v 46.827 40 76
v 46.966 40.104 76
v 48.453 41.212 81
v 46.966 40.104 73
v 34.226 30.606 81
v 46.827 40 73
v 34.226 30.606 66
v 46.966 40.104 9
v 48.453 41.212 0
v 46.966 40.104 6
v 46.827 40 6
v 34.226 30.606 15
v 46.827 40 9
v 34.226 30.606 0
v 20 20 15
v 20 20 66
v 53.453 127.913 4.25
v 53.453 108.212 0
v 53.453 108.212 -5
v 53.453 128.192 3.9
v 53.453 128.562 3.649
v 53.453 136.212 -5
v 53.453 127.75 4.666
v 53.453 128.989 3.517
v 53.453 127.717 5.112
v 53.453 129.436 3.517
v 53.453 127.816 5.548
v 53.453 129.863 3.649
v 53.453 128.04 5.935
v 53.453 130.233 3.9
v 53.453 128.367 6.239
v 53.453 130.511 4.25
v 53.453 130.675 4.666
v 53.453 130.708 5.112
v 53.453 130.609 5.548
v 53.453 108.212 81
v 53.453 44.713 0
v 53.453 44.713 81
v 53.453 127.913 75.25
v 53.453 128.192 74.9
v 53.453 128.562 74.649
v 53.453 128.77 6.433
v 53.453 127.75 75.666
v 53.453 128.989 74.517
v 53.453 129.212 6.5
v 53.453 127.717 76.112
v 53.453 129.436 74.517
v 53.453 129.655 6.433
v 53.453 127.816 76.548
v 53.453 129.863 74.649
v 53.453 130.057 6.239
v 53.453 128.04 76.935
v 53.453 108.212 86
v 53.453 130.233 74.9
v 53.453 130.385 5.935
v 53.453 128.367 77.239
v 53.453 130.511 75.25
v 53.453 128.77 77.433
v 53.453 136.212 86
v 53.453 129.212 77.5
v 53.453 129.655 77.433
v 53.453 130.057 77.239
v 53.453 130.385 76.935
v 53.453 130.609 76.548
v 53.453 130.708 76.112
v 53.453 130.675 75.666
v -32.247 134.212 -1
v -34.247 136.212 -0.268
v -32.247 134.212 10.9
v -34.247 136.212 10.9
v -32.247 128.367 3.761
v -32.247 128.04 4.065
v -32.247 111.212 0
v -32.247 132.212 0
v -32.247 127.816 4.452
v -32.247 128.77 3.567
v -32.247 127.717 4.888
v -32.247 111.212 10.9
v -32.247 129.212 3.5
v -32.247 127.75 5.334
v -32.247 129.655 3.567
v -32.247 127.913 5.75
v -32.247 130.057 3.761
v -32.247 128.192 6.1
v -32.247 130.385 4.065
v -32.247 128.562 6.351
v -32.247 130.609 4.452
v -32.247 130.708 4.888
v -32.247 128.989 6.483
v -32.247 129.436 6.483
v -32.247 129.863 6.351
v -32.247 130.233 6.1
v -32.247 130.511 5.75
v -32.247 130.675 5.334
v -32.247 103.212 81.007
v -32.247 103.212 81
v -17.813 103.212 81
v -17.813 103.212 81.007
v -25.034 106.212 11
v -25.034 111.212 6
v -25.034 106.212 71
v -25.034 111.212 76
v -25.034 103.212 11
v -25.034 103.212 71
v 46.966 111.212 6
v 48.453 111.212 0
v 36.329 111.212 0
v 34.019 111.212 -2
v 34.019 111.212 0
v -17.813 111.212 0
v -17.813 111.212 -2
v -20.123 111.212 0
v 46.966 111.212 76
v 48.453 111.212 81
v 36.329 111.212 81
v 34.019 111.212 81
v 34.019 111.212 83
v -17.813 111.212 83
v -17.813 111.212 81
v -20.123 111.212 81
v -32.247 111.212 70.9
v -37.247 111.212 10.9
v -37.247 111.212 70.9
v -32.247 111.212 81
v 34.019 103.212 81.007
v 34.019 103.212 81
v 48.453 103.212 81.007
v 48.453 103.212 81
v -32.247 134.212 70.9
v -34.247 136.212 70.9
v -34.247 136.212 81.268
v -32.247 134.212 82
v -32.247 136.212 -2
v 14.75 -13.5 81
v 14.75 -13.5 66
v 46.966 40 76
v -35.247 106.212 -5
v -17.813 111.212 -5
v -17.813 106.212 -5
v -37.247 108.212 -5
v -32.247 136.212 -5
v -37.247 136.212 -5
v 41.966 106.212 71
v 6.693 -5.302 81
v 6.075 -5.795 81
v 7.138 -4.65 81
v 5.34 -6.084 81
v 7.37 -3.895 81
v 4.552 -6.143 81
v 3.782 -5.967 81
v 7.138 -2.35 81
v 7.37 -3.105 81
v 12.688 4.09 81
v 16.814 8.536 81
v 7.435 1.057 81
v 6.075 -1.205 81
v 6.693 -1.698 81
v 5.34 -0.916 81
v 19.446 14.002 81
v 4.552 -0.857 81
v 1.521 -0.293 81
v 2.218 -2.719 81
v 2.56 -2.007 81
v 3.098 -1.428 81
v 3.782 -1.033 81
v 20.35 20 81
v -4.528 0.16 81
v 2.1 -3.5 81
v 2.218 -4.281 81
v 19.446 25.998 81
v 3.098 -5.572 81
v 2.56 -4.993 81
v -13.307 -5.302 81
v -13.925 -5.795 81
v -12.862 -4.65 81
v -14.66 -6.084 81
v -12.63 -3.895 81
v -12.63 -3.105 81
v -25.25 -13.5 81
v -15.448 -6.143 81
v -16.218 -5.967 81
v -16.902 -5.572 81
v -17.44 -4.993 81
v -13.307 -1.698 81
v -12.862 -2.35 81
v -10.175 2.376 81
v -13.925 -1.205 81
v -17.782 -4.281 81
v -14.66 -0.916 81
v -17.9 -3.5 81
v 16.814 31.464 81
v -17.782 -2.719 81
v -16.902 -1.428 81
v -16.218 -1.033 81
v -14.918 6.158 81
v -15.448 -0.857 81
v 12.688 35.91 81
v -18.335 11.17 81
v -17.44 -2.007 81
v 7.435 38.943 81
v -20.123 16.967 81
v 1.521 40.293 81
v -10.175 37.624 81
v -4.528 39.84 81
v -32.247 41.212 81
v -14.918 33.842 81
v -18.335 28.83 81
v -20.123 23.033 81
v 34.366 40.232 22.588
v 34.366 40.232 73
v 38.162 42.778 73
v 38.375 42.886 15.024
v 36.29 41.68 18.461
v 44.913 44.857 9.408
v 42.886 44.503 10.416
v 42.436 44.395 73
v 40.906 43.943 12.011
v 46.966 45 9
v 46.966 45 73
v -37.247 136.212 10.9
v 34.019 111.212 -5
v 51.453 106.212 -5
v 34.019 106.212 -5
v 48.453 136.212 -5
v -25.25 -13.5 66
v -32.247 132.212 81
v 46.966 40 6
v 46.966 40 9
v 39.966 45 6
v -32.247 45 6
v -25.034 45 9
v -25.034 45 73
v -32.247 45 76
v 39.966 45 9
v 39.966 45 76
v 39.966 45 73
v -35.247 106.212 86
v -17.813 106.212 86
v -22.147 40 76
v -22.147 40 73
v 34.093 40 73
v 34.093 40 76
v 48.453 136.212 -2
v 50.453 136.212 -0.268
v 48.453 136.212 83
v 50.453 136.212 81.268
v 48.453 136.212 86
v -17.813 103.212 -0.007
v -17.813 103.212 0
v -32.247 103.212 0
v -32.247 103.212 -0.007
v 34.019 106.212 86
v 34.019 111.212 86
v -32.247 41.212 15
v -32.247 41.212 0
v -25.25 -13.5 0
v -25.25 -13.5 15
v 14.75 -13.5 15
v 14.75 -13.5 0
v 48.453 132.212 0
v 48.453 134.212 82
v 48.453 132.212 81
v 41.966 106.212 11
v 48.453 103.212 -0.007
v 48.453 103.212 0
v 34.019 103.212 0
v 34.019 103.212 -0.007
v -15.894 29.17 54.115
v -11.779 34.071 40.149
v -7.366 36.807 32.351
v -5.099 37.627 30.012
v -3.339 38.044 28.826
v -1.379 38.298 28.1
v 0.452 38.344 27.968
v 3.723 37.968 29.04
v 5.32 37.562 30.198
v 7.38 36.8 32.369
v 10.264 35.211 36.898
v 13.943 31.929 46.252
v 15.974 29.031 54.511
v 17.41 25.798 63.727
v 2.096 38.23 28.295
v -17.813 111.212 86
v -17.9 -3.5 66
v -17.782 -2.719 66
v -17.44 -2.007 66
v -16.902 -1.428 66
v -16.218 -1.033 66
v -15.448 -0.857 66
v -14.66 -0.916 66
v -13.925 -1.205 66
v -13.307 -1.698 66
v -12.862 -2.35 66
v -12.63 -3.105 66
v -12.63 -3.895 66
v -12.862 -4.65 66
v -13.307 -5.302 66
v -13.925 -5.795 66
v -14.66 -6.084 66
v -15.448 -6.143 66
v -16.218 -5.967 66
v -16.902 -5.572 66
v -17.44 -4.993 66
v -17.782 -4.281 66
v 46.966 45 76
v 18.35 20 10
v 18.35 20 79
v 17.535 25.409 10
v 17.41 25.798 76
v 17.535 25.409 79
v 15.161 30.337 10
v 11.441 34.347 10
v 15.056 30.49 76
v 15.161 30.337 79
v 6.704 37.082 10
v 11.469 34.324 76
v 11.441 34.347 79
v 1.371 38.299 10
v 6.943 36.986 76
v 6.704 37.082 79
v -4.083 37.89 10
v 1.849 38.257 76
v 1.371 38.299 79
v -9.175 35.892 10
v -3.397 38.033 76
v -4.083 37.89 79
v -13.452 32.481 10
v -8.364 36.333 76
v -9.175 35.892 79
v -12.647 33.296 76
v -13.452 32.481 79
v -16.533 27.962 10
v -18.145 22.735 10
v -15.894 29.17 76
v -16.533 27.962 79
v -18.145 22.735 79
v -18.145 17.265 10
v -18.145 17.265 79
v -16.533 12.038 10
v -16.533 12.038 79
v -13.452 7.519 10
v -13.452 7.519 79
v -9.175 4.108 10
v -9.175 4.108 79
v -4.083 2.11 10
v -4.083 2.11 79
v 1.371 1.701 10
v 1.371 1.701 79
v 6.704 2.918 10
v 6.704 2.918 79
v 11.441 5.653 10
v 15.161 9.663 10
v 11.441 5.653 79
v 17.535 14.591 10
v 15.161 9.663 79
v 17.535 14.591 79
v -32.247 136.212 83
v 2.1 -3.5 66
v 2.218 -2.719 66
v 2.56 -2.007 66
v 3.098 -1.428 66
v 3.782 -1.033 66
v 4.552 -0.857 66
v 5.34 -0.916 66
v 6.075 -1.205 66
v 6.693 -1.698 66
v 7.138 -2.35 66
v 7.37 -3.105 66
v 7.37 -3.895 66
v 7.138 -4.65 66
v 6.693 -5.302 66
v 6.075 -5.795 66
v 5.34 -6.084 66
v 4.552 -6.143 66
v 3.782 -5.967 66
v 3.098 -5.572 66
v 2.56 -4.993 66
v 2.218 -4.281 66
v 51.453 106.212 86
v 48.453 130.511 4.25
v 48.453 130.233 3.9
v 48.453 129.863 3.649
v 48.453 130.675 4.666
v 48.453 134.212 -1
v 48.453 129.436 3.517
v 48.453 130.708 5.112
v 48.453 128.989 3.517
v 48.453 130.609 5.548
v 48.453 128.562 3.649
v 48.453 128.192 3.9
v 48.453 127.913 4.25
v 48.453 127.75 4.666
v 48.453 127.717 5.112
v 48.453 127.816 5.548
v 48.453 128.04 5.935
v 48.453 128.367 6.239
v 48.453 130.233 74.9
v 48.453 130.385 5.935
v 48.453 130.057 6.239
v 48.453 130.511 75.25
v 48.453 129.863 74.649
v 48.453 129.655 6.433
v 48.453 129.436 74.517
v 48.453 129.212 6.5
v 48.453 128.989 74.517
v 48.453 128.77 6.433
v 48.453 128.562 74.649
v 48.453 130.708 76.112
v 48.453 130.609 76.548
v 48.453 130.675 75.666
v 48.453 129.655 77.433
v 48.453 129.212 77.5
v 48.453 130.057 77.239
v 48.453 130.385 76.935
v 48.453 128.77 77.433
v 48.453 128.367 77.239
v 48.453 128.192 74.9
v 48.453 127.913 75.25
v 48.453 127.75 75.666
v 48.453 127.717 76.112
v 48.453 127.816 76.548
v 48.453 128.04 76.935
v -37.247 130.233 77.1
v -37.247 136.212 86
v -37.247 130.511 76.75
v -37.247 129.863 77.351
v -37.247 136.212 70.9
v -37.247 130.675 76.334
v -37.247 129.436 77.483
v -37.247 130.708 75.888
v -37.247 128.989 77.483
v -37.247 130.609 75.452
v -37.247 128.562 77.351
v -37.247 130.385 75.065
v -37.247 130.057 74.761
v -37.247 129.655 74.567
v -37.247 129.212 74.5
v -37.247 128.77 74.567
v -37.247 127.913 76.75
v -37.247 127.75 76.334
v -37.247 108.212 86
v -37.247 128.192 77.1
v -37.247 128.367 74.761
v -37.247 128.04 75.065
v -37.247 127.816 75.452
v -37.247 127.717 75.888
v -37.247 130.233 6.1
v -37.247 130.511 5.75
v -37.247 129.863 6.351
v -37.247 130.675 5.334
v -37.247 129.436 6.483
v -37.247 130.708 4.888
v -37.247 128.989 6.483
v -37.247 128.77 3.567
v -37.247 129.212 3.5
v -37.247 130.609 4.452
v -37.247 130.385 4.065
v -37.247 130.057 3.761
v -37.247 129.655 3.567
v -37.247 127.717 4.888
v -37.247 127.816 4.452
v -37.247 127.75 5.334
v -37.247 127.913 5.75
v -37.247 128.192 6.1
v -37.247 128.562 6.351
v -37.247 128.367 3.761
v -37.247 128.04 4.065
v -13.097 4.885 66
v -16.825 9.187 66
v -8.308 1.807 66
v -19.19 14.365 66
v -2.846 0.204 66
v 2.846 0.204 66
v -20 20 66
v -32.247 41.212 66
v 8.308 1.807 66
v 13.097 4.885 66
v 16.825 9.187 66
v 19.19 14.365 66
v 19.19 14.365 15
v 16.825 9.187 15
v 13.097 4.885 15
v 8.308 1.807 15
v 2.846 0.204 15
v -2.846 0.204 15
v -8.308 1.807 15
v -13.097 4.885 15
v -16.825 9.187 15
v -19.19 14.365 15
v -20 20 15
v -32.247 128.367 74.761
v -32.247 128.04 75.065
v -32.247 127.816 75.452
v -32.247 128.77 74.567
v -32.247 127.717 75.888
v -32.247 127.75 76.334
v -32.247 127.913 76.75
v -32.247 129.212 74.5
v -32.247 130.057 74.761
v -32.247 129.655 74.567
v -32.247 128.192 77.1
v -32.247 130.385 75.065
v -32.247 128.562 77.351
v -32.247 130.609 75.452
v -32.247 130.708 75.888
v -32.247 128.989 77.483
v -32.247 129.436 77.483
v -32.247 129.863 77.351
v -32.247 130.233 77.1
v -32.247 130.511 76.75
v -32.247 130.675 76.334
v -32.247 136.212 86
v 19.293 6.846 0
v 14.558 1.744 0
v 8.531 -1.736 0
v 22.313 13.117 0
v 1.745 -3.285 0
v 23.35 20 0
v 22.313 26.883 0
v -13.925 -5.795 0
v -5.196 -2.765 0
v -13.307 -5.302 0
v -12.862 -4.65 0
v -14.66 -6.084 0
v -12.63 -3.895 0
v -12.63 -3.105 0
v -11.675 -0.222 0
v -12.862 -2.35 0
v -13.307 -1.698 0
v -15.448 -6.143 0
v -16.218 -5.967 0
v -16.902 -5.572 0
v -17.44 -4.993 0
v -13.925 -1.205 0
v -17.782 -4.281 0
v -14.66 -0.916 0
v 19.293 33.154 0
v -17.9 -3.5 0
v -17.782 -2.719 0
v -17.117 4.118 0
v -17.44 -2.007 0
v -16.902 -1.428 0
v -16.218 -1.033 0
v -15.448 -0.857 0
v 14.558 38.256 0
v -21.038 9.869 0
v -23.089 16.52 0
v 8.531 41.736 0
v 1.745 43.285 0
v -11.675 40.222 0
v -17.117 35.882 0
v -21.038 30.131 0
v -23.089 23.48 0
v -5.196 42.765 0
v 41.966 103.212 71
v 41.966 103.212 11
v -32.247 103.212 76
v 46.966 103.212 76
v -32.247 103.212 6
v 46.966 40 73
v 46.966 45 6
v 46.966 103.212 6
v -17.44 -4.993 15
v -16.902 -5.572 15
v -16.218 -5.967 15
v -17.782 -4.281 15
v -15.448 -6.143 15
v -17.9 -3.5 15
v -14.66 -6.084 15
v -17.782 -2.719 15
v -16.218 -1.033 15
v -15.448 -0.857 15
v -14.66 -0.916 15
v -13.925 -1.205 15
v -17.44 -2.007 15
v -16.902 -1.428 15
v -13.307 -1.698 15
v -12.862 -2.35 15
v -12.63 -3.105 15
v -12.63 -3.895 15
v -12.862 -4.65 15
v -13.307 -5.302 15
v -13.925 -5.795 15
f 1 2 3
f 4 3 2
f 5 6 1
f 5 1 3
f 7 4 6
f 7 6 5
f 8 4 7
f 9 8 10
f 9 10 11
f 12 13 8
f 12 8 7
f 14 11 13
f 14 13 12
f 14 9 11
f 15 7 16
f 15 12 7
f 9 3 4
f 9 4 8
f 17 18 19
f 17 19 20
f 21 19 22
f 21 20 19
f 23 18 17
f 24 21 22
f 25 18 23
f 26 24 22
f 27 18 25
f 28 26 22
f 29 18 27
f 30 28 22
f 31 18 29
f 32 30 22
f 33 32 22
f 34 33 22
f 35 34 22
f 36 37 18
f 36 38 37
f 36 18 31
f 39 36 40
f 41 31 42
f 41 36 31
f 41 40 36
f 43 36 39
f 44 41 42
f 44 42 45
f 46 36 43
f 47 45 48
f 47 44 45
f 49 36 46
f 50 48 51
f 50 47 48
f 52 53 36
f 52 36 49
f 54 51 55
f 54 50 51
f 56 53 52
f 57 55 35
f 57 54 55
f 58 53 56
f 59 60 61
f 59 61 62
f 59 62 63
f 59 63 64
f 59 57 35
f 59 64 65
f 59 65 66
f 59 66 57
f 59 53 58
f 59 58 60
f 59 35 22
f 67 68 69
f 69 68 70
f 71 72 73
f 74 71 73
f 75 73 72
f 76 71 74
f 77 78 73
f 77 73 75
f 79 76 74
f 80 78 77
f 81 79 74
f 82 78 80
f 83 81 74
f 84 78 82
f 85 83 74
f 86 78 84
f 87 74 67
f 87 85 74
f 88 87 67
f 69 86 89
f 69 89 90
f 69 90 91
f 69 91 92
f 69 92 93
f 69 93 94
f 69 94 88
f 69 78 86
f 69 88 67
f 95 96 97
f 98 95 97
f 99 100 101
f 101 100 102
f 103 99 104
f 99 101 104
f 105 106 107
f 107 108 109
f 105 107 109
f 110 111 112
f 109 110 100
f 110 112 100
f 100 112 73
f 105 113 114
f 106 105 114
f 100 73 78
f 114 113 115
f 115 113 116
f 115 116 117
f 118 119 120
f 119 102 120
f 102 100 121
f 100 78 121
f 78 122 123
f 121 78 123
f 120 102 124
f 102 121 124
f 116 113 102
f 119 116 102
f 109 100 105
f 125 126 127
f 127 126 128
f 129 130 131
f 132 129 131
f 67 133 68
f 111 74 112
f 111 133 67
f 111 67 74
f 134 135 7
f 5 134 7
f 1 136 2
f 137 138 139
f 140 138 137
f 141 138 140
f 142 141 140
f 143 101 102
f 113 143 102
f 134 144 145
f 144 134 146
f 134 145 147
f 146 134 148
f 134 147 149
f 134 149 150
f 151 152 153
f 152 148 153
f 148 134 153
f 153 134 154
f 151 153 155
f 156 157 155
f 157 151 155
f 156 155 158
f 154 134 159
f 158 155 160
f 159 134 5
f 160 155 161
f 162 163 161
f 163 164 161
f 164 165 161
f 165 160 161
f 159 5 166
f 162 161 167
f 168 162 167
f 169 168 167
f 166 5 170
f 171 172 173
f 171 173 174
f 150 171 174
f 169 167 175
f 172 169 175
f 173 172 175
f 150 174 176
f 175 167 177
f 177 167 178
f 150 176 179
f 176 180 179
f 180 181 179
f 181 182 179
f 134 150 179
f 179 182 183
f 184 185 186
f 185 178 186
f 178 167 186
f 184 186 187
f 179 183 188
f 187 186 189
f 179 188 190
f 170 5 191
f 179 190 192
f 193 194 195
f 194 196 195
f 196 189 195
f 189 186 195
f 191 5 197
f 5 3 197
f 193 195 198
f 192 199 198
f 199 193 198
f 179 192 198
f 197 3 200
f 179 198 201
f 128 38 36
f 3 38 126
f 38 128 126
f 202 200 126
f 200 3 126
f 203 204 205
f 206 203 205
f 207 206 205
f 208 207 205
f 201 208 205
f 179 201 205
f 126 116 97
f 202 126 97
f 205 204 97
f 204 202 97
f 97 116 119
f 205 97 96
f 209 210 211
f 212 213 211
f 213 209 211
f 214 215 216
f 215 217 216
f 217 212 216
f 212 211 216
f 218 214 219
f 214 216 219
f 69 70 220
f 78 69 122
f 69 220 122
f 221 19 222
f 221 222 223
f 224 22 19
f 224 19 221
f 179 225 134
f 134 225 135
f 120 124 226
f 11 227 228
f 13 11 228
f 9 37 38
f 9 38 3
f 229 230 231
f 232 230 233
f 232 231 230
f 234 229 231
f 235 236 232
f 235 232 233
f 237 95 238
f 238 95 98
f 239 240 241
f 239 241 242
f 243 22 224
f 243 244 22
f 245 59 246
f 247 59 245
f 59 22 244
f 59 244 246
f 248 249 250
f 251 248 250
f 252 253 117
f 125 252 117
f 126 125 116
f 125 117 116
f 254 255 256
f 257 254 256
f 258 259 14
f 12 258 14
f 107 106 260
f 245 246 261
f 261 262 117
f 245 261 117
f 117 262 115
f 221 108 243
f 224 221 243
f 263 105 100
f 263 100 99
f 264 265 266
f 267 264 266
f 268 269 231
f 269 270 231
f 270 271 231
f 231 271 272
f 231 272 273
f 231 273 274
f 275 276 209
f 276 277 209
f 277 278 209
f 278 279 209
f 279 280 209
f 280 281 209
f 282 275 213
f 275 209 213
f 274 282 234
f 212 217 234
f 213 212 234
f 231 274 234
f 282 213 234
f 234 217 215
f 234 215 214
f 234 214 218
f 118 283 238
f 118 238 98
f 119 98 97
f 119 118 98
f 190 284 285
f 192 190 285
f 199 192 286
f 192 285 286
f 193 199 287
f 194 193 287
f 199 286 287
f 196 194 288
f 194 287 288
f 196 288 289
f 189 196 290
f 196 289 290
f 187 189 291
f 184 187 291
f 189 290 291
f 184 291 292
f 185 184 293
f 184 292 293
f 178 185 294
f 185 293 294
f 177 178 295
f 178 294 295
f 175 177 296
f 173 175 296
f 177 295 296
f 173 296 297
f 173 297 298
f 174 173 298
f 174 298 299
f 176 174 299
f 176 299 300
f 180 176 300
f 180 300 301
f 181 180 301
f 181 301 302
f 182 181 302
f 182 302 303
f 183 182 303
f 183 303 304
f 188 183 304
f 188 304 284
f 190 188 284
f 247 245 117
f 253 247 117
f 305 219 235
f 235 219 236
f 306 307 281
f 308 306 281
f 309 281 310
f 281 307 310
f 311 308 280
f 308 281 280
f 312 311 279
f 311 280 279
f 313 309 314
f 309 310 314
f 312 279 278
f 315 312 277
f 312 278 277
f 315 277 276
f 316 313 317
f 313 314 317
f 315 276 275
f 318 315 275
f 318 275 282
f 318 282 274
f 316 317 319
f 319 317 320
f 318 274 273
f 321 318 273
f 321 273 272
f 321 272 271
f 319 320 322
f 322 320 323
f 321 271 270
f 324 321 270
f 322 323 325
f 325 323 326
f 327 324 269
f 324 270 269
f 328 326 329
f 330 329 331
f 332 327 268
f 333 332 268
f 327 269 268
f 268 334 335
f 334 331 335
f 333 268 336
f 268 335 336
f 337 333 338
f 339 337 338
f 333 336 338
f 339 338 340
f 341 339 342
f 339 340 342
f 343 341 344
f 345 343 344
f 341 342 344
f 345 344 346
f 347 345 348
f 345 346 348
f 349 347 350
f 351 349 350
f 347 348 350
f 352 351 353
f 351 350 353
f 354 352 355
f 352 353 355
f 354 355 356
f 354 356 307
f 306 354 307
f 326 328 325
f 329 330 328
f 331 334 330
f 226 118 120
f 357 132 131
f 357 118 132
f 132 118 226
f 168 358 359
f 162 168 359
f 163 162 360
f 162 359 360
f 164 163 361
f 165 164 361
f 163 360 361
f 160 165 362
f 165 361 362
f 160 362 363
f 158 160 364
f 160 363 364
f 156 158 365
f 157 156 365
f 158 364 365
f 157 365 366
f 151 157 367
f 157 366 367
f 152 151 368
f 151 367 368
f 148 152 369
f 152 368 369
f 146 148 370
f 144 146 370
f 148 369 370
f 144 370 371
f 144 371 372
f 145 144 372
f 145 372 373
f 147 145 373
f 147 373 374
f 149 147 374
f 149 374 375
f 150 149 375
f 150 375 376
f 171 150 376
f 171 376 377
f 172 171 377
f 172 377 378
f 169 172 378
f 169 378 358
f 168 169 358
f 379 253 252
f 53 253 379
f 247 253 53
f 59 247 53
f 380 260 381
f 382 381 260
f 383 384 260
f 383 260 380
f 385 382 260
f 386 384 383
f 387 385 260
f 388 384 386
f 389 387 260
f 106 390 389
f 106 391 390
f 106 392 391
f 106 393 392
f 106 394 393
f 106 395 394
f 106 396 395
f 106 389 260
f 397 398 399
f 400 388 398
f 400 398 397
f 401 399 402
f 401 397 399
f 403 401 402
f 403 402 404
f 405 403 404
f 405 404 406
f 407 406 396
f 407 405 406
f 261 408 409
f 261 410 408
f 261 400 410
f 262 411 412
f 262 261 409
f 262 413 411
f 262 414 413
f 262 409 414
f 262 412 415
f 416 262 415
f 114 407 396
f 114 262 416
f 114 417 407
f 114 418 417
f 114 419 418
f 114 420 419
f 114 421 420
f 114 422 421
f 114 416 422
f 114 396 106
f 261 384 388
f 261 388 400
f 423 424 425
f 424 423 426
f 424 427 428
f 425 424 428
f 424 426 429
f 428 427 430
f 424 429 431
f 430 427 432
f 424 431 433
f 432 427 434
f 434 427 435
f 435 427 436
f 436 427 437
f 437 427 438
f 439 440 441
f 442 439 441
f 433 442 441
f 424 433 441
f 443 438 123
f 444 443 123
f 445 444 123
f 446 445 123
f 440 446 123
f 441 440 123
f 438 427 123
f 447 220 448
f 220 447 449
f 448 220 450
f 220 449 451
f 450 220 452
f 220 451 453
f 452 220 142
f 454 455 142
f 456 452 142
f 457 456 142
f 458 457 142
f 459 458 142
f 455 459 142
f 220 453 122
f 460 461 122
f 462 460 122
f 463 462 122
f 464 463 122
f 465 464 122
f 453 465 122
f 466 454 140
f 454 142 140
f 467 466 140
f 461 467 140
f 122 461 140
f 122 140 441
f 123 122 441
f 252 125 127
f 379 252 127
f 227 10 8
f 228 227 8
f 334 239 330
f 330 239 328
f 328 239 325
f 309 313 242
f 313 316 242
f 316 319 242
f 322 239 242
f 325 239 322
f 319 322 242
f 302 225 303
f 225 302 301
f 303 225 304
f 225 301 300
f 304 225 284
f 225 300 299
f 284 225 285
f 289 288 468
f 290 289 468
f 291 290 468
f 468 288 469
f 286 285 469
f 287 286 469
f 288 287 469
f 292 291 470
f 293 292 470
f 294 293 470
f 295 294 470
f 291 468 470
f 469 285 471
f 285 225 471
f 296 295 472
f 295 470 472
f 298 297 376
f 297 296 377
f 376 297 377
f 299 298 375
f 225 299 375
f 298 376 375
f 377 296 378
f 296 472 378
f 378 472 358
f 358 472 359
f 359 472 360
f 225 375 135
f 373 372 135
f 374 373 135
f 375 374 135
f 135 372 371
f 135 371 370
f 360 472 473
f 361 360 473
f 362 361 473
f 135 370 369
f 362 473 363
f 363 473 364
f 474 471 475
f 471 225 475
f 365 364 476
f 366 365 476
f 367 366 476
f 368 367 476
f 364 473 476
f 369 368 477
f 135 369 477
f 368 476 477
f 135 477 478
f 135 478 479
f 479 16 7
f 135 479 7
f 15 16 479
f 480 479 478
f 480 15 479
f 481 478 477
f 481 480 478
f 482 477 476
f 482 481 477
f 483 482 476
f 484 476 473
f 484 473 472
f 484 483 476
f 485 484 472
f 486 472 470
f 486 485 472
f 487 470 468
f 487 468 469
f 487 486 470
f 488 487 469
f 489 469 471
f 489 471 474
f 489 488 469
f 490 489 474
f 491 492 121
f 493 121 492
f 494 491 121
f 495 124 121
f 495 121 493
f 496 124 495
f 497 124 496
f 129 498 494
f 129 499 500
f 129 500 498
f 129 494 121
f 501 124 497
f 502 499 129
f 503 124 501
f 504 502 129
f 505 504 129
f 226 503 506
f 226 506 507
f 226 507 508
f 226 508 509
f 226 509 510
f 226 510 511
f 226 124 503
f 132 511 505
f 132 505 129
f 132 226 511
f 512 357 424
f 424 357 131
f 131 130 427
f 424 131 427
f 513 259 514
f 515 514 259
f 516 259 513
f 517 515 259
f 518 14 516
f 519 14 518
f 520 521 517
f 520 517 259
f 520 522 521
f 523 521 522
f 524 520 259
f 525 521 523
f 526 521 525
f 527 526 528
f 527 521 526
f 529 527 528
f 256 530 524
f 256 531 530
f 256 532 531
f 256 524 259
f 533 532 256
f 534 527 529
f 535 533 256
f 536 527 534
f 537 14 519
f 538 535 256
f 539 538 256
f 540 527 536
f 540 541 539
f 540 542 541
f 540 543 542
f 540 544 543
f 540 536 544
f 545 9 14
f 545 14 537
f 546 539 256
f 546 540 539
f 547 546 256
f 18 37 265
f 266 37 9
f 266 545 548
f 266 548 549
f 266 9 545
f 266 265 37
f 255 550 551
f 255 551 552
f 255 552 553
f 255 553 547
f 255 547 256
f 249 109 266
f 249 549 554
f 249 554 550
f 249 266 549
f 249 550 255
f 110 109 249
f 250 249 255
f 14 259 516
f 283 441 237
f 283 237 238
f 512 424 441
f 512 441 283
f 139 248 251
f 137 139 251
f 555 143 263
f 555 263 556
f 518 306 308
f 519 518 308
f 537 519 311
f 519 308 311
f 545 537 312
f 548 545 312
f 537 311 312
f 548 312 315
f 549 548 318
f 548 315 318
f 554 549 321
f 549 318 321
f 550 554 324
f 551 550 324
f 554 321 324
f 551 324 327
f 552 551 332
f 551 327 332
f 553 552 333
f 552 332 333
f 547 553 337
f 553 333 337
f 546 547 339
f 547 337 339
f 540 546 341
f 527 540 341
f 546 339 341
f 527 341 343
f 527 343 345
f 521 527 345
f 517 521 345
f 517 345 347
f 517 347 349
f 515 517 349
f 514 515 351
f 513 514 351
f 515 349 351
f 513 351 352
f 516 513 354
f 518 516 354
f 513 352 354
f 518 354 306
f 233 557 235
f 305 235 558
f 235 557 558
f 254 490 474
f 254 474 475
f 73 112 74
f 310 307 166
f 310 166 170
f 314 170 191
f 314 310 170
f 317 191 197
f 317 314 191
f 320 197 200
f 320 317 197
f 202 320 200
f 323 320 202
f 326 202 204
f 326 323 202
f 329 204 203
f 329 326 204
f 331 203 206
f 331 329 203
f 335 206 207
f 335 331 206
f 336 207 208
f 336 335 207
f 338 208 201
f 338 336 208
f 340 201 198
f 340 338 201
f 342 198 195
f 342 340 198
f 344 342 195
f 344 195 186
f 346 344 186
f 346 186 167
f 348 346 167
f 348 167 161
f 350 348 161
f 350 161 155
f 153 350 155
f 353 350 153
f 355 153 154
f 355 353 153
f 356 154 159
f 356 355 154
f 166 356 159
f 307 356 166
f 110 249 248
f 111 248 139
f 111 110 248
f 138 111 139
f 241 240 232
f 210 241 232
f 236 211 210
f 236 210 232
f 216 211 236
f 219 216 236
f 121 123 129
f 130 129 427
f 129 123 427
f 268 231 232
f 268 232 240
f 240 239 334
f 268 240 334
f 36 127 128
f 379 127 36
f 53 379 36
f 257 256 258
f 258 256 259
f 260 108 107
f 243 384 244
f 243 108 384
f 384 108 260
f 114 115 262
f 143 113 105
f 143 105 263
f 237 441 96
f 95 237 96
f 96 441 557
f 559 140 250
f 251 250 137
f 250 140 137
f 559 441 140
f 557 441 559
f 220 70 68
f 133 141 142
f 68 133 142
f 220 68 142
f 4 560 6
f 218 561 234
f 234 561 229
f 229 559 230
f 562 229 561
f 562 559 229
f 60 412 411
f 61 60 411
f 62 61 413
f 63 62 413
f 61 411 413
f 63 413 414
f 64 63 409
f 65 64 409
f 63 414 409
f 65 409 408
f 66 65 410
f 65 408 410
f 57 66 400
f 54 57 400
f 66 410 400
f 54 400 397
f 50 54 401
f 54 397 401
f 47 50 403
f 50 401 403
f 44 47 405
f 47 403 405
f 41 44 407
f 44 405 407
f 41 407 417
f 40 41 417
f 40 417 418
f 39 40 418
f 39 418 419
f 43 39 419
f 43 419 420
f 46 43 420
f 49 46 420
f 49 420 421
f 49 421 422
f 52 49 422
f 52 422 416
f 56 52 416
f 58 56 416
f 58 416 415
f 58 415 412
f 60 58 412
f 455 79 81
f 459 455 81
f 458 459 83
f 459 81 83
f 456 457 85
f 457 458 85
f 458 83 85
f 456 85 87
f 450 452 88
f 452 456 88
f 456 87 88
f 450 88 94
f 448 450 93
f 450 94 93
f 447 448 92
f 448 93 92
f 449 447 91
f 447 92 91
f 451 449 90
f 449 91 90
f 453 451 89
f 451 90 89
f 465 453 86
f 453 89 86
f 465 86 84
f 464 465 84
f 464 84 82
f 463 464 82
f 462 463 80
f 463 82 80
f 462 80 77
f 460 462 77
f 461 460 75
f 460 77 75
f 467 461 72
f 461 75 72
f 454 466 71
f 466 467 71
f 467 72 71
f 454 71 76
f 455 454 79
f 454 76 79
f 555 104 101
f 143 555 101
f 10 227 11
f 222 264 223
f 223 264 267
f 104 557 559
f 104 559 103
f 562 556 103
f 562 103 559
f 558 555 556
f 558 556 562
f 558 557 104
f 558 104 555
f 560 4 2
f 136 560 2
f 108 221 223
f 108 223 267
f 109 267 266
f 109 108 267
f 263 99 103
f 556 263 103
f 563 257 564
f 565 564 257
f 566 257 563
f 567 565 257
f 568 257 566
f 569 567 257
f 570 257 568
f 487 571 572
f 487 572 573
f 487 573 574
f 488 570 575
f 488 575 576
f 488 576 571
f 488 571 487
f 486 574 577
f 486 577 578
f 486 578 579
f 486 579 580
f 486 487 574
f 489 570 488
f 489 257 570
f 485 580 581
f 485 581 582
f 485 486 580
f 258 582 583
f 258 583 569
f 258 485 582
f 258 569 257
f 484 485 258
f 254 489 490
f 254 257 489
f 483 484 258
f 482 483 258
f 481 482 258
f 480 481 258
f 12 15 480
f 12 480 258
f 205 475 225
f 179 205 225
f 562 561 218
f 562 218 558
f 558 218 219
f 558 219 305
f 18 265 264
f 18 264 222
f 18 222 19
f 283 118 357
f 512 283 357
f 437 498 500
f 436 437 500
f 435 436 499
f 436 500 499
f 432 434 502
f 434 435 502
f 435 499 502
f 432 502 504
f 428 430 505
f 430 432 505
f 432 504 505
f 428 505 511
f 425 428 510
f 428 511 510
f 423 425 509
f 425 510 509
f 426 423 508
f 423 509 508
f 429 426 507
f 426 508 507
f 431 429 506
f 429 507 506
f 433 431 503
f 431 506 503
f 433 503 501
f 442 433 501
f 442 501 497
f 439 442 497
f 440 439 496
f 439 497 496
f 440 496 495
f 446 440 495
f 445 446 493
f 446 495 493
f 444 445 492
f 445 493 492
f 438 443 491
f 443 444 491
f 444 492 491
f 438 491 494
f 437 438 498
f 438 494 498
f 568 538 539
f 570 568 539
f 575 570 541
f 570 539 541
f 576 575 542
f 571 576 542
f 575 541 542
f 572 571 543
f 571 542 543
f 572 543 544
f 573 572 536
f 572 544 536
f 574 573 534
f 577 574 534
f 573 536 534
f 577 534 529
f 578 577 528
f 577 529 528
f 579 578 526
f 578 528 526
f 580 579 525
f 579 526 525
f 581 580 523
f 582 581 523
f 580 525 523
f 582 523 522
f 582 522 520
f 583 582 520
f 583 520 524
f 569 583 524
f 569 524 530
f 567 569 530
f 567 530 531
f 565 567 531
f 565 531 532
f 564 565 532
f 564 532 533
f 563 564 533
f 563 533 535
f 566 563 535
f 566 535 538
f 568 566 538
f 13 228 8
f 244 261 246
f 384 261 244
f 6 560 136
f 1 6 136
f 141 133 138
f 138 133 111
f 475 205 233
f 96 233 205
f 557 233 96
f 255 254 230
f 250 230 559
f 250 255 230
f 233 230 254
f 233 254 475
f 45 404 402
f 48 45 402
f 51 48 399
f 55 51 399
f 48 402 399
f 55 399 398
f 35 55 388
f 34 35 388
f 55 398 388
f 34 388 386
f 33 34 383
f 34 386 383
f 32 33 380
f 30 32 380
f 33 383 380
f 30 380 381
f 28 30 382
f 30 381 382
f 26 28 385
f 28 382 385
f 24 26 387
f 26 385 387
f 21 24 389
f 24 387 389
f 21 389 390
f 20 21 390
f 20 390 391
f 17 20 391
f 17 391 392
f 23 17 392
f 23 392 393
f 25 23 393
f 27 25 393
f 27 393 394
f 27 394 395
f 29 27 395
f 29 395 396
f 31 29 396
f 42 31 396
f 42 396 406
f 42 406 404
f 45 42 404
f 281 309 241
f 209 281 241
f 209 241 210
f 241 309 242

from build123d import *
from OCP.BRepFilletAPI import BRepFilletAPI_MakeChamfer

# Parameters (mm, degrees)
AUFSATZ_LINEAR_AUSTRAGEN1_DEPTH      = 81
SCHNITT_LINEAR_START                 = -5
SCHNITT_LINEAR_AUSTRAGEN1_DEPTH      = 70
AUFSATZ_LINEAR_START                 = -7
SKIZZE7_W                            = 3
SKIZZE7_H                            = 5
AUFSATZ_LINEAR_AUSTRAGEN2_DEPTH      = 72
SCHNITT_LINEAR_AUSTRAGEN2_DEPTH      = 156.38326520426057
AUFSATZ_LINEAR_AUSTRAGEN16_REACH     = 147.866
AUFSATZ_LINEAR_AUSTRAGEN17_DEPTH     = 5
AUFSATZ_LINEAR_AUSTRAGEN18_DEPTH     = 5
F_3_0_3_DURCHMESSER_BOHRUNG1_D       = 3
F_3_0_3_DURCHMESSER_BOHRUNG1_DEPTH   = 5
AUFSATZ_LINEAR_AUSTRAGEN19_DEPTH     = 65
F_21_5_21_5_DURCHMESSER_BOHRUNG1_D   = 36.7
SCHNITT_LINEAR_AUSTRAGEN3_DEPTH      = 167.766454168909
FASE1_SIZE                           = 2
AUFSATZ_LINEAR_AUSTRAGEN20_REACH     = 178.15
FASE3_SIZE                           = 2
FASE4_SIZE                           = 2
AUFSATZ_LINEAR_AUSTRAGEN21_REACH     = 178.15
F_3_0_3_DURCHMESSER_BOHRUNG2_D       = 3
AUFSATZ_LINEAR_START_2               = -15
AUFSATZ_LINEAR_AUSTRAGEN22_DEPTH     = 15
AUFSATZ_LINEAR_AUSTRAGEN23_DEPTH     = 15
FASE5_SIZE                           = 3
FASE5_SIZE2                          = 4.992838447051577
F_5_3_5_3_DURCHMESSER_BOHRUNG1_D     = 5.3
F_5_3_5_3_DURCHMESSER_BOHRUNG2_D     = 5.3
F_5_3_5_3_DURCHMESSER_BOHRUNG2_DEPTH = 15
FASE6_SIZE                           = 2
FASE7_SIZE                           = 5
FASE7_SIZE2                          = 10
AUFSATZ_LINEAR_AUSTRAGEN24_DEPTH     = 81
SCHNITT_LINEAR_START_2               = -66.212436
SCHNITT_LINEAR_AUSTRAGEN4_DEPTH      = 66.212436
SCHNITT_LINEAR_AUSTRAGEN5_REACH      = 186.868
AUFSATZ_LINEAR_AUSTRAGEN25_DEPTH     = 7
AUFSATZ_LINEAR_AUSTRAGEN27_REACH     = 169.248
VERRUNDUNG1_R                        = 20


with BuildPart() as part:
    # Skizze1 → Aufsatz-Linear austragen1 (new body)
    with BuildSketch(Plane.XY):
        with BuildLine():
            Line((-20, 19.999999999999996), (-32.24700538379256, 41.212435565298236))
            Line((-32.24700538379256, 41.212435565298236), (-32.24700538379256, 111.21243556529824))
            Line((-32.24700538379256, 111.21243556529824), (48.45299461620745, 111.21243556529824))
            Line((48.45299461620745, 111.21243556529824), (48.45299461620745, 41.21243556529823))
            Line((48.45299461620745, 41.21243556529823), (20, 19.999999999999996))
            ThreePointArc((20, 19.999999999999996), (1.22e-15, 0), (-20, 19.999999999999996))
        make_face()
    extrude(amount=AUFSATZ_LINEAR_AUSTRAGEN1_DEPTH)

    # Skizze2 → Schnitt-Linear austragen1 (cut)
    with BuildSketch(Plane.XY.offset(81).offset(SCHNITT_LINEAR_START)):
        with BuildLine():
            Line((10.6, 19.999999999999993), (39.96624327025953, 45))
            Line((39.96624327025953, 45), (39.96624327025955, 111.21243556529822))
            Line((39.96624327025955, 111.21243556529822), (-25.033756729740457, 111.21243556529824))
            Line((-25.033756729740457, 111.21243556529824), (-25.03375672974045, 45))
            Line((-25.03375672974045, 45), (-10.6, 19.999999999999993))
            ThreePointArc((-10.6, 19.999999999999993), (-1.7e-15, 9.4), (10.6, 19.999999999999993))
        make_face()
    extrude(amount=-SCHNITT_LINEAR_AUSTRAGEN1_DEPTH, mode=Mode.SUBTRACT)

    # Skizze7 → Aufsatz-Linear austragen2 (add)
    with BuildSketch(Plane.ZY.offset(-39.966243270259525).offset(AUFSATZ_LINEAR_START)):
        Polygon((5.999999999999991, 111.21243556529824), (10.999999999999993, 106.21243556529822), (10.999999999999993, 103.21243556529822), (5.999999999999991, 103.21243556529822), align=None)
        Polygon((76, 111.21243556529824), (71, 106.21243556529825), (71, 103.21243556529825), (76, 103.21243556529825), align=None)
        with Locations((74.5, 42.50000000000001)):
            Rectangle(SKIZZE7_W, SKIZZE7_H)
        with Locations((7.499999999999991, 42.50000000000001)):
            Rectangle(SKIZZE7_W, SKIZZE7_H)
    extrude(amount=AUFSATZ_LINEAR_AUSTRAGEN2_DEPTH)

    # Skizze8 → Schnitt-Linear austragen2 (cut, through all)
    with BuildSketch(Plane.ZY.offset(-39.966243270259525)):
        Polygon((10.999999999999993, 103.21243556529822), (5.999999999999991, 103.21243556529825), (5.999999999999991, 45.00000000000001), (76, 45.00000000000001), (76, 103.21243556529825), (71, 103.21243556529825), align=None)
    extrude(amount=SCHNITT_LINEAR_AUSTRAGEN2_DEPTH, mode=Mode.SUBTRACT)

    # Aufsatz-Linear austragen16: up to this face of the body (flat: up to its plane)
    aufsatz_linear_austragen16_end = Plane(part.part.faces().sort_by_distance((6.820175039, 63.309969875, 0))[0])
    # Skizze12 → Aufsatz-Linear austragen16 (add, up to the picked face)
    with BuildSketch(Plane.XY.offset(81), mode=Mode.PRIVATE) as aufsatz_linear_austragen16_sk1:
        Polygon((48.45299461620745, 136.21243556529822), (48.45299461620745, 111.21243556529824), (48.45299461620745, 103.21243556529824), (53.45299461620744, 108.21243556529842), (53.45299461620744, 136.21243556529822), align=None)
    aufsatz_linear_austragen16_tool1 = split(extrude(aufsatz_linear_austragen16_sk1.sketch, amount=-AUFSATZ_LINEAR_AUSTRAGEN16_REACH, mode=Mode.PRIVATE), bisect_by=aufsatz_linear_austragen16_end, keep=Keep.BOTH, mode=Mode.PRIVATE)
    # Skizze12 → Aufsatz-Linear austragen16 (add, up to the picked face)
    with BuildSketch(Plane.XY.offset(81), mode=Mode.PRIVATE) as aufsatz_linear_austragen16_sk2:
        Polygon((-37.24700538379256, 136.21243556529825), (-32.24700538379256, 136.21243556529825), (-32.24700538379256, 111.21243556529824), (-32.24700538379256, 103.21243556529825), (-37.24700538379256, 108.21243556529829), align=None)
    aufsatz_linear_austragen16_tool2 = split(extrude(aufsatz_linear_austragen16_sk2.sketch, amount=-AUFSATZ_LINEAR_AUSTRAGEN16_REACH, mode=Mode.PRIVATE), bisect_by=aufsatz_linear_austragen16_end, keep=Keep.BOTH, mode=Mode.PRIVATE)
    add(aufsatz_linear_austragen16_tool1.solids().sort_by(Axis((50.884689, 120.928283, 81), (0, 0, -1)))[0])
    add(aufsatz_linear_austragen16_tool2.solids().sort_by(Axis((-34.678699, 120.928283, 81), (0, 0, -1)))[0])

    # Skizze13 → Aufsatz-Linear austragen17 (add)
    with BuildSketch(Plane(origin=(0, 0, 0), x_dir=(-1, 0, 0), z_dir=(0, 0, -1))):
        Polygon((37.24700538379256, 136.21243556529825), (32.24700538379256, 136.21243556529825), (17.813248654051872, 111.21243556529824), (17.813248654051872, 103.21243556529825), (32.24700538379256, 103.21243556529825), (37.24700538379256, 108.21243556529829), align=None)
        Polygon((-53.45299461620744, 136.21243556529822), (-53.45299461620745, 108.21243556529842), (-48.45299461620745, 103.21243556529824), (-34.01923788646676, 103.21243556529824), (-34.01923788646676, 111.21243556529824), (-48.45299461620745, 136.21243556529822), align=None)
    extrude(amount=AUFSATZ_LINEAR_AUSTRAGEN17_DEPTH)

    # Skizze14 → Aufsatz-Linear austragen18 (add)
    with BuildSketch(Plane.XY.offset(81)):
        Polygon((-32.24700538379256, 136.21243556529825), (-37.24700538379256, 136.21243556529825), (-37.24700538379256, 108.21243556529829), (-32.24700538379256, 103.21243556529825), (-17.813248654051876, 103.21243556529825), (-17.813248654051872, 111.21243556529824), align=None)
        Polygon((53.45299461620744, 136.21243556529822), (48.45299461620745, 136.21243556529822), (34.019237886466776, 111.21243556529824), (34.019237886466776, 103.21243556529824), (48.45299461620745, 103.21243556529824), (53.45299461620745, 108.21243556529842), align=None)
    extrude(amount=AUFSATZ_LINEAR_AUSTRAGEN18_DEPTH)

    # Ø3.0 (3) Durchmesser Bohrung1
    with Locations(Plane.ZY.offset(37.24700538379256)):
        with Locations((5, 129.212435565), (76, 129.212435565)):
            Hole(F_3_0_3_DURCHMESSER_BOHRUNG1_D / 2, depth=F_3_0_3_DURCHMESSER_BOHRUNG1_DEPTH)

    # Skizze21 → Aufsatz-Linear austragen19 (add)
    with BuildSketch(Plane.ZY.offset(-39.966243270259525)):
        Polygon((65.99999999999999, 20), (65.99999999999999, 25), (8.999999999999991, 45.00000000000001), (5.999999999999991, 45.00000000000001), (5.999999999999995, 20), align=None)
    extrude(amount=AUFSATZ_LINEAR_AUSTRAGEN19_DEPTH)

    # Ø21.5 (21.5) Durchmesser Bohrung1 (through all)
    with Locations(Plane(origin=(0, 0, 0), x_dir=(-1, 0, 0), z_dir=(0, 0, -1))):
        with Locations((0, 20)):
            Hole(F_21_5_21_5_DURCHMESSER_BOHRUNG1_D / 2)

    # Skizze22 → Schnitt-Linear austragen3 (cut, through all)
    with BuildSketch(Plane(origin=(0, 8.3e-16, 5.999999999999997), x_dir=(-1, 0, 0), z_dir=(0, -1.4e-16, -1))):
        Polygon((-39.966243270259525, 34.88534527083473), (-39.96624327025953, 19.999999999999996), (-20, 19.999999999999996), align=None)
        Polygon((20.000000000000004, 20), (25.033756729740453, 28.718722408852198), (25.033756729740453, 20), align=None)
    extrude(amount=-SCHNITT_LINEAR_AUSTRAGEN3_DEPTH, mode=Mode.SUBTRACT)

    # Fase1
    fase1_edges = [part.edges().sort_by_distance(p)[0] for p in [
        (-25.030127018922215, 123.71243556529825, 81),
        (-25.030127018922215, 123.71243556529825, 0),
    ]]
    chamfer(fase1_edges, length=FASE1_SIZE)

    # Skizze23 → Aufsatz-Linear austragen20 (add, up to next)
    with BuildSketch(Plane(origin=(-17.81324865405192, 7.73e-15, 0), x_dir=(0, 0, -1), z_dir=(1, 2.2e-16, 0)), mode=Mode.PRIVATE) as aufsatz_linear_austragen20_sk1:
        Polygon((-82.99999999999997, 111.21243556529822), (-81, 107.2124355652983), (-81, 111.21243556529822), align=None)
    aufsatz_linear_austragen20_tool1 = extrude(aufsatz_linear_austragen20_sk1.sketch, amount=-AUFSATZ_LINEAR_AUSTRAGEN20_REACH, mode=Mode.PRIVATE) - part.part
    # Skizze23 → Aufsatz-Linear austragen20 (add, up to next)
    with BuildSketch(Plane(origin=(-17.81324865405192, 7.73e-15, 0), x_dir=(0, 0, -1), z_dir=(1, 2.2e-16, 0)), mode=Mode.PRIVATE) as aufsatz_linear_austragen20_sk2:
        Polygon((-1.73e-15, 107.21243556529824), (2.000000000000009, 111.21243556529822), (-1.1e-16, 111.21243556529822), align=None)
    aufsatz_linear_austragen20_tool2 = extrude(aufsatz_linear_austragen20_sk2.sketch, amount=-AUFSATZ_LINEAR_AUSTRAGEN20_REACH, mode=Mode.PRIVATE) - part.part
    add(aufsatz_linear_austragen20_tool1.solids().sort_by_distance((-17.813249, 109.879102, 81.666667))[0])
    add(aufsatz_linear_austragen20_tool2.solids().sort_by_distance((-17.813249, 109.879102, -0.666667))[0])

    # Fase3
    fase3_edges = [part.edges().sort_by_distance(p)[0] for p in [
        (41.236116251337116, 123.71243556529822, 81),
        (41.23611625133711, 123.71243556529822, 0),
    ]]
    chamfer(fase3_edges, length=FASE3_SIZE)

    # Fase4
    fase4_edges = [part.edges().sort_by_distance(p)[0] for p in [
        (48.45299461620745, 136.21243556529822, 40.5),
        (-32.247005383792555, 136.21243556529825, 40.50000000000001),
    ]]
    chamfer(fase4_edges, length=FASE4_SIZE)

    # Skizze24 → Aufsatz-Linear austragen21 (add, up to next)
    with BuildSketch(Plane.ZY.offset(-34.01923788646676), mode=Mode.PRIVATE) as aufsatz_linear_austragen21_sk1:
        Polygon((-1.999999999999974, 111.21243556529824), (0, 107.2124355652983), (0, 111.21243556529824), align=None)
    aufsatz_linear_austragen21_tool1 = extrude(aufsatz_linear_austragen21_sk1.sketch, amount=-AUFSATZ_LINEAR_AUSTRAGEN21_REACH, mode=Mode.PRIVATE) - part.part
    # Skizze24 → Aufsatz-Linear austragen21 (add, up to next)
    with BuildSketch(Plane.ZY.offset(-34.01923788646676), mode=Mode.PRIVATE) as aufsatz_linear_austragen21_sk2:
        Polygon((83, 111.21243556529824), (80.31502577388078, 105.84248711305969), (80.31502577388078, 111.21243556529824), align=None)
    aufsatz_linear_austragen21_tool2 = extrude(aufsatz_linear_austragen21_sk2.sketch, amount=-AUFSATZ_LINEAR_AUSTRAGEN21_REACH, mode=Mode.PRIVATE) - part.part
    add(aufsatz_linear_austragen21_tool1.solids().sort_by_distance((34.019238, 109.879102, -0.666667))[0])
    add(aufsatz_linear_austragen21_tool2.solids().sort_by_distance((34.019238, 109.422453, 81.210017))[0])

    # Ø3.0 (3) Durchmesser Bohrung2 (through all)
    with Locations(Plane(origin=(53.45299461620744, 0, 0), x_dir=(0, 0, -1), z_dir=(1, 0, 0))):
        with Locations((-76, 129.212435565), (-5, 129.212435565)):
            Hole(F_3_0_3_DURCHMESSER_BOHRUNG2_D / 2)

    # Skizze30 → Aufsatz-Linear austragen22 (add)
    with BuildSketch(Plane.XY.offset(81).offset(AUFSATZ_LINEAR_START_2)):
        with BuildLine():
            Line((-25.25, -13.5), (14.750000000000002, -13.5))
            Line((14.750000000000002, -13.5), (34.226497308103724, 30.606217782649114))
            Line((34.226497308103724, 30.606217782649114), (20.000000000000004, 19.999999999999996))
            ThreePointArc((20.000000000000004, 19.999999999999996), (-3.67e-15, -3.55e-15), (-20, 19.999999999999996))
            Line((-20, 19.999999999999996), (-32.24700538379256, 41.212435565298236))
            Line((-32.24700538379256, 41.212435565298236), (-25.25, -13.5))
        make_face()
    extrude(amount=AUFSATZ_LINEAR_AUSTRAGEN22_DEPTH)

    # Skizze31 → Aufsatz-Linear austragen23 (add)
    with BuildSketch(Plane(origin=(0, 0, 0), x_dir=(-1, 0, 0), z_dir=(0, 0, -1))):
        with BuildLine():
            Line((-34.226497308103724, 30.606217782649114), (-20, 19.999999999999996))
            ThreePointArc((-20, 19.999999999999996), (-3.22e-15, 1.066e-14), (20, 19.999999999999996))
            Line((20, 19.999999999999996), (32.24700538379256, 41.212435565298236))
            Line((32.24700538379256, 41.212435565298236), (25.25, -13.5))
            Line((25.25, -13.5), (-14.749999999999998, -13.5))
            Line((-14.749999999999998, -13.5), (-34.226497308103724, 30.606217782649114))
        make_face()
    extrude(amount=-AUFSATZ_LINEAR_AUSTRAGEN23_DEPTH)

    # Fase5: one chamfer whose edges measure the first distance from different faces: ONE call of the kernel's chamfer builder (chamfer() names one face for all edges)
    fase5_edges_1 = [part.edges().sort_by_distance(p)[0] for p in [
        (41.23611625133711, 103.21243556529824, -5),
    ]]
    fase5_side_1 = [part.faces().sort_by_distance(p)[0] for p in [
        (45.48560109201637, 116.83988365625363, -5),
    ]]
    fase5_edges_2 = [part.edges().sort_by_distance(p)[0] for p in [
        (-25.030127018922215, 103.21243556529825, -5),
    ]]
    fase5_side_2 = [part.faces().sort_by_distance(p)[0] for p in [
        (-29.279611859601495, 116.83988365625365, -5),
    ]]
    fase5_edges_3 = [part.edges().sort_by_distance(p)[0] for p in [
        (-25.03012701892222, 103.21243556529825, 86),
    ]]
    fase5_side_3 = [part.faces().sort_by_distance(p)[0] for p in [
        (-29.279611859601484, 116.83988365625365, 86),
    ]]
    fase5_edges_4 = [part.edges().sort_by_distance(p)[0] for p in [
        (41.23611625133711, 103.21243556529824, 86),
    ]]
    fase5_side_4 = [part.faces().sort_by_distance(p)[0] for p in [
        (45.485601092016374, 116.83988365625362, 86),
    ]]
    fase5 = BRepFilletAPI_MakeChamfer(part.part.solid().wrapped)
    for e in fase5_edges_1:
        fase5.Add(FASE5_SIZE, FASE5_SIZE2, e.wrapped, fase5_side_1[0].wrapped)  # the first distance lies on this face
    for e in fase5_edges_2:
        fase5.Add(FASE5_SIZE, FASE5_SIZE2, e.wrapped, fase5_side_2[0].wrapped)  # the first distance lies on this face
    for e in fase5_edges_3:
        fase5.Add(FASE5_SIZE, FASE5_SIZE2, e.wrapped, fase5_side_3[0].wrapped)  # the first distance lies on this face
    for e in fase5_edges_4:
        fase5.Add(FASE5_SIZE, FASE5_SIZE2, e.wrapped, fase5_side_4[0].wrapped)  # the first distance lies on this face
    add(Compound.cast(fase5.Shape()), mode=Mode.REPLACE)

    # Ø5.3 (5.3) Durchmesser Bohrung1 (through all)
    with Locations(Plane.XY.offset(81)):
        with Locations((-15.25, -3.5)):
            Hole(F_5_3_5_3_DURCHMESSER_BOHRUNG1_D / 2)

    # Ø5.3 (5.3) Durchmesser Bohrung2
    with Locations(Plane.XY.offset(81)):
        with Locations((4.75, -3.5)):
            Hole(F_5_3_5_3_DURCHMESSER_BOHRUNG2_D / 2, depth=F_5_3_5_3_DURCHMESSER_BOHRUNG2_DEPTH)

    # Fase6
    fase6_edges = [part.edges().sort_by_distance(p)[0] for p in [
        (-18.35, 20.000000000000004, 81),
    ]]
    chamfer(fase6_edges, length=FASE6_SIZE)

    # Fase7
    fase7_edges = [part.edges().sort_by_distance(p)[0] for p in [
        (-18.35, 20.000000000000004, 0),
    ]]
    fase7_side = [part.faces().sort_by_distance(p)[0] for p in [
        (6.001968826777722, 58.75126670064612, 0),
    ]]
    chamfer(fase7_edges, length=FASE7_SIZE, length2=FASE7_SIZE2, reference=fase7_side[0])

    # Skizze39 → Aufsatz-Linear austragen24 (add)
    with BuildSketch(Plane(origin=(0, 0, 0), x_dir=(-1, 0, 0), z_dir=(0, 0, -1))):
        Polygon((-48.45299461620745, 103.21243556529824), (-48.45299461620745, 111.21243556529824), (-53.45299461620744, 111.21243556529824), (-53.452994616207434, 44.71347325634675), (-48.45299461620745, 41.21243556529823), align=None)
    extrude(amount=-AUFSATZ_LINEAR_AUSTRAGEN24_DEPTH)

    # Skizze40 → Schnitt-Linear austragen4 (cut)
    with BuildSketch(Plane(origin=(0, 111.21243556529824, 0), x_dir=(1, 0, 0), z_dir=(0, 1, 0)).offset(SCHNITT_LINEAR_START_2)):
        Polygon((39.96624327025955, -76), (39.96624327025955, -5.999999999999991), (46.966243270259525, -5.999999999999991), (46.96624327025955, -76), align=None)
    extrude(amount=SCHNITT_LINEAR_AUSTRAGEN4_DEPTH, mode=Mode.SUBTRACT)

    # Schnitt-Linear austragen5: up to this face of the body (flat: up to its plane)
    schnitt_linear_austragen5_end = Plane(part.part.faces().sort_by_distance((-32.247005384, 122.674493846, 40.5))[0])
    # Skizze44 → Schnitt-Linear austragen5 (cut, up to the picked face)
    with BuildSketch(Plane.ZY.offset(37.24700538379256), mode=Mode.PRIVATE) as schnitt_linear_austragen5_sk1:
        Polygon((10.900000000000007, 136.21243556529822), (10.900000000000011, 111.21243556529822), (70.9, 111.21243556529824), (70.9, 136.21243556529828), align=None)
    schnitt_linear_austragen5_tool1 = split(extrude(schnitt_linear_austragen5_sk1.sketch, amount=-SCHNITT_LINEAR_AUSTRAGEN5_REACH, mode=Mode.PRIVATE), bisect_by=schnitt_linear_austragen5_end, keep=Keep.BOTH, mode=Mode.PRIVATE)
    add(schnitt_linear_austragen5_tool1.solids().sort_by(Axis((-37.247005, 123.712436, 40.9), (1, 0, 0)))[0], mode=Mode.SUBTRACT)

    # Skizze41 → Aufsatz-Linear austragen25 (add)
    with BuildSketch(Plane(origin=(39.96624327025955, 0, 0), x_dir=(0, 0, -1), z_dir=(1, 0, 0))):
        Polygon((-71, 106.21243556529824), (-76, 111.21243556529824), (-76, 103.21243556529824), (-71, 103.21243556529824), align=None)
        Polygon((-5.999999999999991, 103.21243556529821), (-5.999999999999991, 111.21243556529824), (-10.999999999999993, 106.21243556529821), (-10.999999999999993, 103.21243556529821), align=None)
    extrude(amount=AUFSATZ_LINEAR_AUSTRAGEN25_DEPTH)

    # Aufsatz-Linear austragen27: up to this face of the body (flat: up to its plane)
    aufsatz_linear_austragen27_end = Plane(part.part.faces().sort_by_distance((7.359618967, 74.106217763, 6))[0])
    # Skizze46 → Aufsatz-Linear austragen27 (add, up to the picked face)
    with BuildSketch(Plane(origin=(0, 0, 76), x_dir=(-1, 0, 0), z_dir=(0, 0, -1)), mode=Mode.PRIVATE) as aufsatz_linear_austragen27_sk1:
        Polygon((-46.96624327025955, 111.21243556529824), (-41.96624327025953, 106.21243556529825), (-41.96624327025953, 103.21243556529825), (-46.96624327025955, 103.21243556529825), align=None)
    aufsatz_linear_austragen27_tool1 = split(extrude(aufsatz_linear_austragen27_sk1.sketch, amount=AUFSATZ_LINEAR_AUSTRAGEN27_REACH, mode=Mode.PRIVATE), bisect_by=aufsatz_linear_austragen27_end, keep=Keep.BOTH, mode=Mode.PRIVATE)
    add(aufsatz_linear_austragen27_tool1.solids().sort_by(Axis((44.845031, 106.15183, 76), (0, 0, -1)))[0])

    # Verrundung1
    # the kernel refuses this fillet: 20 mm, written as the material it takes off along each edge
    with BuildSketch(Plane(origin=(39.96624327025953, 45, 73), x_dir=(0.9999999999999981, -6.2100252559308e-08, 0), z_dir=(0, 0, -1))) as verrundung1_piece_1_section:
        with BuildLine():
            CenterArc((7.364113453491243, 19.99668526013716), VERRUNDUNG1_R, 229.59166053400796, 39.36517362751647)
            Line((-5.600501285825948, 4.767805962530279), (0, 0))
            Line((0, 0), (7.0000000000000275, 0))
        make_face()
    verrundung1_piece_1 = extrude(amount=82.387765692995, mode=Mode.PRIVATE)
    verrundung1_piece_1 = split(verrundung1_piece_1, bisect_by=Plane(origin=(40.238295620402674, 34.86532480900939, 37.883824294323226), z_dir=(0, 0.9435999821328808, 0.33108771302908113)), keep=Keep.TOP, mode=Mode.PRIVATE)
    add(verrundung1_piece_1, mode=Mode.SUBTRACT)


solid = part.part
